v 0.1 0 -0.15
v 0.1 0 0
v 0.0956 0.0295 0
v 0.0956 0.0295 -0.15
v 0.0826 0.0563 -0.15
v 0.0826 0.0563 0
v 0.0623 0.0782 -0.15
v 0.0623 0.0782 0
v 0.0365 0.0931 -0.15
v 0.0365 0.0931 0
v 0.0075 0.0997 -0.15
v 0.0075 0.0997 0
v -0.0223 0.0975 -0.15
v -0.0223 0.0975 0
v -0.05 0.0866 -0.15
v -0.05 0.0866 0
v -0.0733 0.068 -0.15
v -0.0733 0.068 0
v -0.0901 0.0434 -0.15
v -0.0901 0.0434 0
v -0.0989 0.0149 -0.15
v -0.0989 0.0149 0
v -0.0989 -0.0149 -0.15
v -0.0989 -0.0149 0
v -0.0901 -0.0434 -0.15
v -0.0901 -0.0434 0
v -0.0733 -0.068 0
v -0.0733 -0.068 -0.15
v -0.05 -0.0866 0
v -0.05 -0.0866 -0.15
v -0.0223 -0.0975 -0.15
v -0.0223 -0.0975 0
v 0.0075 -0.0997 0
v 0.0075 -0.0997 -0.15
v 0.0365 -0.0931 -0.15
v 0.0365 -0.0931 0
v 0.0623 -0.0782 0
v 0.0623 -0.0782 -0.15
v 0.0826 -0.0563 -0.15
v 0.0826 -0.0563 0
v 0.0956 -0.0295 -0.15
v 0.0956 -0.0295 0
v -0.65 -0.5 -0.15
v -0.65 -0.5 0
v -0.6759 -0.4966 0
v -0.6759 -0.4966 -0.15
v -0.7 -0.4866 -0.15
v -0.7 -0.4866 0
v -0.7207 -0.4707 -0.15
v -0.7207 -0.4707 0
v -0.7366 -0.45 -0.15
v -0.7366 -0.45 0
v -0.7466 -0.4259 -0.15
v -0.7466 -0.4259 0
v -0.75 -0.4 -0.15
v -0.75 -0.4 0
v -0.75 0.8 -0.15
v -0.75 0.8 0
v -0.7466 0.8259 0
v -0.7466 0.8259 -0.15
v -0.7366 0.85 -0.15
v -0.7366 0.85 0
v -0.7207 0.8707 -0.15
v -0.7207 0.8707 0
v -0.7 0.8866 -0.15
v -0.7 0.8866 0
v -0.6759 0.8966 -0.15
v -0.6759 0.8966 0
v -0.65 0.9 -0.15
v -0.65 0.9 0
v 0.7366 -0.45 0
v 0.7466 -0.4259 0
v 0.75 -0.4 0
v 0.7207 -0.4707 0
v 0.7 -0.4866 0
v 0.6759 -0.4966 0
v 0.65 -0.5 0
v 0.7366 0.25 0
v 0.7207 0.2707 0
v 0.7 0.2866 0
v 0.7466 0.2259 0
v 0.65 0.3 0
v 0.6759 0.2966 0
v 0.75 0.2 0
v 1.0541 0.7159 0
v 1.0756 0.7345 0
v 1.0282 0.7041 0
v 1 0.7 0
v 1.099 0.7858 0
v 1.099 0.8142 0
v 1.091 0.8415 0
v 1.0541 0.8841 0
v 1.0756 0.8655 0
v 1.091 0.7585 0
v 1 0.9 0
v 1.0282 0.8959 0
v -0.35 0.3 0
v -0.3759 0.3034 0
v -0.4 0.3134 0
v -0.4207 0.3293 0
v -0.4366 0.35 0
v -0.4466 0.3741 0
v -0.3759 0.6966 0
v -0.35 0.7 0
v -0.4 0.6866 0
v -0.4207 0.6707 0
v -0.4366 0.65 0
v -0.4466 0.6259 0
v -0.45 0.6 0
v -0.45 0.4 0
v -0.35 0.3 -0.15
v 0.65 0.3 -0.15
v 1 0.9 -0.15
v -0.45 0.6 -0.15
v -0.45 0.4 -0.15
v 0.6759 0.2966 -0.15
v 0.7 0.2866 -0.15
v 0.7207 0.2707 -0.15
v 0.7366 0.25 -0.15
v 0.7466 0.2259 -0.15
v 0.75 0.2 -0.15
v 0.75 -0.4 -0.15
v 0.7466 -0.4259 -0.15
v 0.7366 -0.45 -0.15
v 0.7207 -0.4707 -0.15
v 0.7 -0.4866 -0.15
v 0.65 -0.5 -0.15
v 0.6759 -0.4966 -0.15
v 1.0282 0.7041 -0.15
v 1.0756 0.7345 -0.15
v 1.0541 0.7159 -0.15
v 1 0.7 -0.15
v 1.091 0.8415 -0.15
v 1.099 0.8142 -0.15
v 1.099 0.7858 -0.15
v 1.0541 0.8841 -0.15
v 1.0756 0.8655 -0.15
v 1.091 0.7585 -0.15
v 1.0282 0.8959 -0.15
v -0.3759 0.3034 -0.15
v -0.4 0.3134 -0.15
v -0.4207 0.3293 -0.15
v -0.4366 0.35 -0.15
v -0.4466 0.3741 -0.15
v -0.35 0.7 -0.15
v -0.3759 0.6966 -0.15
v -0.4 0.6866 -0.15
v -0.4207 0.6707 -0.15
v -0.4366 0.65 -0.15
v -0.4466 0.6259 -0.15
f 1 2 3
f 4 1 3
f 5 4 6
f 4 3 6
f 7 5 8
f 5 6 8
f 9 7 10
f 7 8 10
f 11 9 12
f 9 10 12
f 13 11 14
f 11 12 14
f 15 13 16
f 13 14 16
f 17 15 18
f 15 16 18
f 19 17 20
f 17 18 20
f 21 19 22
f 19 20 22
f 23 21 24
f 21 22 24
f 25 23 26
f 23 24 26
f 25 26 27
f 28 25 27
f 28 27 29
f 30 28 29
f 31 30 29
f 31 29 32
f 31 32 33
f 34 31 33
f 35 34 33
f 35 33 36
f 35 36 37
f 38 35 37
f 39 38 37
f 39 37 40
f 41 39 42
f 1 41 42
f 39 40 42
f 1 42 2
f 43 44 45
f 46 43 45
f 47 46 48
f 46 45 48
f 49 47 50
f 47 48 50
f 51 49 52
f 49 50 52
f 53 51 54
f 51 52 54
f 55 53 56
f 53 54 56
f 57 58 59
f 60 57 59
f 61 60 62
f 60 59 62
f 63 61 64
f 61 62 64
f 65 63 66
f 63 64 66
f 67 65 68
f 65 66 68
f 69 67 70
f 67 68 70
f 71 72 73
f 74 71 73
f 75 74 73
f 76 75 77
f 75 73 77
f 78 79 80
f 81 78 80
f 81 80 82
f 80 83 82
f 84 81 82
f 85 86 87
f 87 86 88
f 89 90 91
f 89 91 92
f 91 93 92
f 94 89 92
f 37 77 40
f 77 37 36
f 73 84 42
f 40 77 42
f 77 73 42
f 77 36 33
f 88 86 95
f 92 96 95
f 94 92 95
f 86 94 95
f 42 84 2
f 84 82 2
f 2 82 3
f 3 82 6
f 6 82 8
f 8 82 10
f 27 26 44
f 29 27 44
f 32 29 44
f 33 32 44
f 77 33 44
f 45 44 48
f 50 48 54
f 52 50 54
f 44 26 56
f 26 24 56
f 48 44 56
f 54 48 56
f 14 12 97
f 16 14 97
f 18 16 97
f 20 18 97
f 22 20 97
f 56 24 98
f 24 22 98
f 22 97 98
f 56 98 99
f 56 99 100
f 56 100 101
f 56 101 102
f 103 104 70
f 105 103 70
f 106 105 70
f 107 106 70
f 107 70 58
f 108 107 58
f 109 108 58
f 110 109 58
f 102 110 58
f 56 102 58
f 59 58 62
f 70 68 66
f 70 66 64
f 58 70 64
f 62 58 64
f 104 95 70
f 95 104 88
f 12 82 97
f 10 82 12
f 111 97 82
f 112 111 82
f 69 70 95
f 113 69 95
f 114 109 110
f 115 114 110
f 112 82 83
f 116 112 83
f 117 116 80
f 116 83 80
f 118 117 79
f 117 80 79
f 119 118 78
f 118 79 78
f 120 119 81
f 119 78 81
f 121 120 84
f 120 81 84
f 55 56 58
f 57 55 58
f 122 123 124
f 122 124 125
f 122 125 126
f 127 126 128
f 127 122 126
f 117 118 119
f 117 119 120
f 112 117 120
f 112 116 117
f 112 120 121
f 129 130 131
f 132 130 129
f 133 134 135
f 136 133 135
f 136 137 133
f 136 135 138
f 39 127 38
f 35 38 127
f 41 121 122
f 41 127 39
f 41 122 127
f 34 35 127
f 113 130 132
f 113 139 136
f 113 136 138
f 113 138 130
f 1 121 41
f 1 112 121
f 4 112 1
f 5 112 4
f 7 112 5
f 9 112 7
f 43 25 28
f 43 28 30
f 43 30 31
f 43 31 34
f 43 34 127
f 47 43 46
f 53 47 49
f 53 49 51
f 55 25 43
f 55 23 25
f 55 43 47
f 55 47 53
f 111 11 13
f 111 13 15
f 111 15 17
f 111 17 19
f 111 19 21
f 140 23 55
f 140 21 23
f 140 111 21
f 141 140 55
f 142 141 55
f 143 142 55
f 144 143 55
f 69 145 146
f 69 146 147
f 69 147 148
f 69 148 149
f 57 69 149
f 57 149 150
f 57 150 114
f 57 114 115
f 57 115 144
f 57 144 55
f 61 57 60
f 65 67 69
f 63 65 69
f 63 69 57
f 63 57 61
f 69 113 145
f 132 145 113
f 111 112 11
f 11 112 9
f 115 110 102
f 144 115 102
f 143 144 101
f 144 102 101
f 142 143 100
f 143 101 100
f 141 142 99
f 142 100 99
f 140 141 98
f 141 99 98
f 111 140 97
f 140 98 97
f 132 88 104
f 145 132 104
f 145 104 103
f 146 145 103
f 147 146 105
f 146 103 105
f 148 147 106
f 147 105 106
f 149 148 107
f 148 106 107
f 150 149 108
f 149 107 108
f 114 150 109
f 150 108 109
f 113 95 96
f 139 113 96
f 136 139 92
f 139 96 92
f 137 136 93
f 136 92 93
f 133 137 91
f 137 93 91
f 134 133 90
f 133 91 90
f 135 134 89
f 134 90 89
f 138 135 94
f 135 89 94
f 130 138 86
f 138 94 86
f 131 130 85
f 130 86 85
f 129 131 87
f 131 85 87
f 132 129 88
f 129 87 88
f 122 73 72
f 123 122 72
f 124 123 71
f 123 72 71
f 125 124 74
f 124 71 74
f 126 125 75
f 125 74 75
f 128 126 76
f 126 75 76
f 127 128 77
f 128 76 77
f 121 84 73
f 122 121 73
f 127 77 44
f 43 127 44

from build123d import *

# Parameters (mm, degrees)
ESQUISSE1_R        = 0.1
BOSS_EXTRU_1_DEPTH = 0.15


with BuildPart() as part:
    # Esquisse1 → Boss.-Extru.1 (new body)
    with BuildSketch(Plane.XY):
        with BuildLine():
            Line((0.75, 0.2), (0.75, -0.4))
            ThreePointArc((0.75, -0.4), (0.720710678, -0.470710678), (0.65, -0.5))
            Line((0.65, -0.5), (-0.65, -0.5))
            ThreePointArc((-0.65, -0.5), (-0.720710678, -0.470710678), (-0.75, -0.4))
            Line((-0.75, -0.4), (-0.75, 0.8))
            ThreePointArc((-0.75, 0.8), (-0.720710678, 0.870710678), (-0.65, 0.9))
            Line((-0.65, 0.9), (1, 0.9))
            ThreePointArc((1, 0.9), (1.1, 0.8), (1, 0.7))
            Line((1, 0.7), (-0.35, 0.7))
            ThreePointArc((-0.35, 0.7), (-0.420710678, 0.670710678), (-0.45, 0.6))
            Line((-0.45, 0.6), (-0.45, 0.4))
            ThreePointArc((-0.45, 0.4), (-0.420710678, 0.329289322), (-0.35, 0.3))
            Line((-0.35, 0.3), (0.65, 0.3))
            ThreePointArc((0.65, 0.3), (0.720710678, 0.270710678), (0.75, 0.2))
        make_face()
        Circle(ESQUISSE1_R, mode=Mode.SUBTRACT)
    extrude(amount=-BOSS_EXTRU_1_DEPTH)


solid = part.part
